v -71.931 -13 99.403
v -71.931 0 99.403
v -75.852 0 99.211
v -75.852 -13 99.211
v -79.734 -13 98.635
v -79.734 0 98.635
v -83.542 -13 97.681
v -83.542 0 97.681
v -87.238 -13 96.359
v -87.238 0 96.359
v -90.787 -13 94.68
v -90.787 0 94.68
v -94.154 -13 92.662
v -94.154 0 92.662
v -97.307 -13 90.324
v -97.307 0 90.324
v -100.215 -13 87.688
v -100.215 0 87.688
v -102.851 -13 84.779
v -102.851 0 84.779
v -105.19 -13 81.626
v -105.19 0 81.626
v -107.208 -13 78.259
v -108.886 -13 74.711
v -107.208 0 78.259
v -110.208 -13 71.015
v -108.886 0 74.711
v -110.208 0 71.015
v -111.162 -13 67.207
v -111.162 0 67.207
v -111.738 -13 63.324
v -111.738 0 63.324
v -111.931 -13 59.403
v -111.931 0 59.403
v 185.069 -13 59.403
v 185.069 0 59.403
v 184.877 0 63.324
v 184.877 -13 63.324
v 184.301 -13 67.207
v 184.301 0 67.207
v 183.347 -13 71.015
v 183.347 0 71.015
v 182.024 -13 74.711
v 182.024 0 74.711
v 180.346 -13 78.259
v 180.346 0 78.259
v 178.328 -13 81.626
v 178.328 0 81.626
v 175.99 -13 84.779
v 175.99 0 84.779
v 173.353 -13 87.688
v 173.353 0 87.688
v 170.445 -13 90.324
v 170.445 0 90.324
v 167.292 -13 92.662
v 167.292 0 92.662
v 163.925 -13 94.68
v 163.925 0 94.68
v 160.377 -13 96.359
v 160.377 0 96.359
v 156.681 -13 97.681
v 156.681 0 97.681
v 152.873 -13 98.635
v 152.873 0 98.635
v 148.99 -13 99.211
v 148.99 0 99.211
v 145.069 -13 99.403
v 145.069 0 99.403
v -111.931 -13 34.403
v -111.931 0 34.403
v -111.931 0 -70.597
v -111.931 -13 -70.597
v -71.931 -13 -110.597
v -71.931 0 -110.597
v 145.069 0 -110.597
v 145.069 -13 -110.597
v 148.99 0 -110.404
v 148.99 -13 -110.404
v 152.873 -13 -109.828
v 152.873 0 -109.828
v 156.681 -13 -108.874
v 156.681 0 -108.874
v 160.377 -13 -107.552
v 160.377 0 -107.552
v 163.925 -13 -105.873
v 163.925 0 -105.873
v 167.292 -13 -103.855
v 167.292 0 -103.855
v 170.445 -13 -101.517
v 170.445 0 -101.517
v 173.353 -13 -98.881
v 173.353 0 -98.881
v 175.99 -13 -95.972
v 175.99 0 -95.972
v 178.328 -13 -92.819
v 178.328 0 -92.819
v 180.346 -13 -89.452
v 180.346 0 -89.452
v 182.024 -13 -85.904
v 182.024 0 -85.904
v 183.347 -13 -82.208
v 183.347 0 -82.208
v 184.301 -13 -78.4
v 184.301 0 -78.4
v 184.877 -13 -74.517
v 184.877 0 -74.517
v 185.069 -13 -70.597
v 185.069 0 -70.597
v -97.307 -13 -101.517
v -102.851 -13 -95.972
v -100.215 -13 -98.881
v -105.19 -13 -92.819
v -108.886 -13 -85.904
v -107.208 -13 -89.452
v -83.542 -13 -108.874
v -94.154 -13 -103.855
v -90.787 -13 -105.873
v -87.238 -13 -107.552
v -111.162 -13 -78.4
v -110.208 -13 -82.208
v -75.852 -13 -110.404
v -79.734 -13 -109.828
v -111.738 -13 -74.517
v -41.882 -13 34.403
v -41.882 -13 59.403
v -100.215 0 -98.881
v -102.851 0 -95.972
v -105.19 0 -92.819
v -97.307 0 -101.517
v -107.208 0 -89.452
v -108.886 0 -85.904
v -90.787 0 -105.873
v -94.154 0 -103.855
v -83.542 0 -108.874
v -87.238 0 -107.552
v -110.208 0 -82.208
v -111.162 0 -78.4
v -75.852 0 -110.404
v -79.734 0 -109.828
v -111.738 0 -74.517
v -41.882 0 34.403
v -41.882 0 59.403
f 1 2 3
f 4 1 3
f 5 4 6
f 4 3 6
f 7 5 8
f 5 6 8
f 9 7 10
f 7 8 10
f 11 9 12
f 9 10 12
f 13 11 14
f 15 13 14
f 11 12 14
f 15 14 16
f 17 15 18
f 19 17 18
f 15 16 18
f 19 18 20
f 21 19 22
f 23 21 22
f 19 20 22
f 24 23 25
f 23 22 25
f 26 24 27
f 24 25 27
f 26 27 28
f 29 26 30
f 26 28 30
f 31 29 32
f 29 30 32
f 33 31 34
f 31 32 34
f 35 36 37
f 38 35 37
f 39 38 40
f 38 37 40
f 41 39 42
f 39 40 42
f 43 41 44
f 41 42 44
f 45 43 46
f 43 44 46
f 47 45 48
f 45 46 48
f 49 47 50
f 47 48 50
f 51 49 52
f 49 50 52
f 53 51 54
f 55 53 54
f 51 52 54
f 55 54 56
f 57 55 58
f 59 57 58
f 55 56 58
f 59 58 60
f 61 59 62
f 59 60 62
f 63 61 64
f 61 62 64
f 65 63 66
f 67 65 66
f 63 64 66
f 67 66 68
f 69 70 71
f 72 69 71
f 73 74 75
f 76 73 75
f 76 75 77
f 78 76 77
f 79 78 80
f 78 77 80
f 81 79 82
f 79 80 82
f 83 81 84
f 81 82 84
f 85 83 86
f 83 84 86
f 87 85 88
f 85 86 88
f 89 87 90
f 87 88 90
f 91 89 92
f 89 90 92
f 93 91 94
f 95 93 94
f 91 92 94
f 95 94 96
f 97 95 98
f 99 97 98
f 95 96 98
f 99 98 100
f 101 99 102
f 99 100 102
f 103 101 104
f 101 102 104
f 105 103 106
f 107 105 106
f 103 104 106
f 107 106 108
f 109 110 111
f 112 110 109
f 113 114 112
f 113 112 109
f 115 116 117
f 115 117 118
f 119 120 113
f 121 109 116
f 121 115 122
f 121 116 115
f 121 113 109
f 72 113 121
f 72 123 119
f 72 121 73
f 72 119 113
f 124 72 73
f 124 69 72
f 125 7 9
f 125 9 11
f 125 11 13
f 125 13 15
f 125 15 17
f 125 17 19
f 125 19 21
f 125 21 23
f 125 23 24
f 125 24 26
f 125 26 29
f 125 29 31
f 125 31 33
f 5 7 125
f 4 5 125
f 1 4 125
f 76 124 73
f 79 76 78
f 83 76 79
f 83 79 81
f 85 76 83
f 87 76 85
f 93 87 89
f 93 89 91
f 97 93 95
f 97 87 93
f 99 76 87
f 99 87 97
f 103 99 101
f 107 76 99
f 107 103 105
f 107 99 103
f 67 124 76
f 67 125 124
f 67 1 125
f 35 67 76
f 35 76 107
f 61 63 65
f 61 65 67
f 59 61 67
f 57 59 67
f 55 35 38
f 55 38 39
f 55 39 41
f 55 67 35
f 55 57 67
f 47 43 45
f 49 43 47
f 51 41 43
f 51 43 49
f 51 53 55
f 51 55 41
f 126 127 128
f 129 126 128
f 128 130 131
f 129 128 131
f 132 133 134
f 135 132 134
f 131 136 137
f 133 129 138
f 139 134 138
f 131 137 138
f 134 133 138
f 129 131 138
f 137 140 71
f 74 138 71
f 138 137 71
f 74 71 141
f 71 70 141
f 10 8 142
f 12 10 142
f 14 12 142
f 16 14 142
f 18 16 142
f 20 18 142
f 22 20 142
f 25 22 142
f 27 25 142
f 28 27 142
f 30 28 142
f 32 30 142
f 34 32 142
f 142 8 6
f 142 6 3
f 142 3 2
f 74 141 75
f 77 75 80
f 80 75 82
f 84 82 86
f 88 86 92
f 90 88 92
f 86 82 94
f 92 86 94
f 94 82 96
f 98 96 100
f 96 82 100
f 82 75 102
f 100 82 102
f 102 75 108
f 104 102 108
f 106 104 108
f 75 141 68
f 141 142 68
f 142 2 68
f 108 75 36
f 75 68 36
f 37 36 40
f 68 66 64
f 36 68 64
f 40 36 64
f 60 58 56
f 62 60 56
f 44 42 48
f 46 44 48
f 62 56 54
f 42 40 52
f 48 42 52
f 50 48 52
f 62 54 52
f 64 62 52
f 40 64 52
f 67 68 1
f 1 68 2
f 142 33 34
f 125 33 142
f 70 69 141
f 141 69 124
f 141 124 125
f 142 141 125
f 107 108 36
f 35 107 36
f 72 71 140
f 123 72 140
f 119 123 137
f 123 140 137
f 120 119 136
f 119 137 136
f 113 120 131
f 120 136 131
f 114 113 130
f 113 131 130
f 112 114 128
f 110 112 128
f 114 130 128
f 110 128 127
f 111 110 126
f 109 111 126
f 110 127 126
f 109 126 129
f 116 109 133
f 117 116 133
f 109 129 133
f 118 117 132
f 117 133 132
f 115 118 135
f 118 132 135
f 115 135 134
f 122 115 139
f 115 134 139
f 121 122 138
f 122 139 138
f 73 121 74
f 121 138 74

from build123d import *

# Parameters (mm, degrees)
F1_DEPTH = 13
F2_W     = 75
F2_H     = 25
F3_DEPTH = 25


with BuildPart() as f1:
    # F0 (on Front) → F1 (new body)
    with BuildSketch(Plane.XZ):
        with BuildLine():
            Line((145.069164, 99.403447), (-71.930836, 99.403447))
            ThreePointArc((-71.930836, 99.403447), (-100.215108, 87.687718), (-111.930836, 59.403447))
            Line((-111.930836, 59.403447), (-111.930836, -70.596553))
            ThreePointArc((-111.930836, -70.596553), (-100.215108, -98.880824), (-71.930836, -110.596553))
            Line((-71.930836, -110.596553), (145.069164, -110.596553))
            ThreePointArc((145.069164, -110.596553), (173.353435, -98.880824), (185.069164, -70.596553))
            Line((185.069164, -70.596553), (185.069164, 59.403447))
            ThreePointArc((185.069164, 59.403447), (173.353435, 87.687718), (145.069164, 99.403447))
        make_face()
    extrude(amount=F1_DEPTH)

    # F2 (on face) → F3 (cut)
    with BuildSketch(Plane.XZ.offset(13)):
        with Locations((-79.382428, 46.903447)):
            Rectangle(F2_W, F2_H)
    extrude(amount=-F3_DEPTH, mode=Mode.SUBTRACT)


solid = f1.part
